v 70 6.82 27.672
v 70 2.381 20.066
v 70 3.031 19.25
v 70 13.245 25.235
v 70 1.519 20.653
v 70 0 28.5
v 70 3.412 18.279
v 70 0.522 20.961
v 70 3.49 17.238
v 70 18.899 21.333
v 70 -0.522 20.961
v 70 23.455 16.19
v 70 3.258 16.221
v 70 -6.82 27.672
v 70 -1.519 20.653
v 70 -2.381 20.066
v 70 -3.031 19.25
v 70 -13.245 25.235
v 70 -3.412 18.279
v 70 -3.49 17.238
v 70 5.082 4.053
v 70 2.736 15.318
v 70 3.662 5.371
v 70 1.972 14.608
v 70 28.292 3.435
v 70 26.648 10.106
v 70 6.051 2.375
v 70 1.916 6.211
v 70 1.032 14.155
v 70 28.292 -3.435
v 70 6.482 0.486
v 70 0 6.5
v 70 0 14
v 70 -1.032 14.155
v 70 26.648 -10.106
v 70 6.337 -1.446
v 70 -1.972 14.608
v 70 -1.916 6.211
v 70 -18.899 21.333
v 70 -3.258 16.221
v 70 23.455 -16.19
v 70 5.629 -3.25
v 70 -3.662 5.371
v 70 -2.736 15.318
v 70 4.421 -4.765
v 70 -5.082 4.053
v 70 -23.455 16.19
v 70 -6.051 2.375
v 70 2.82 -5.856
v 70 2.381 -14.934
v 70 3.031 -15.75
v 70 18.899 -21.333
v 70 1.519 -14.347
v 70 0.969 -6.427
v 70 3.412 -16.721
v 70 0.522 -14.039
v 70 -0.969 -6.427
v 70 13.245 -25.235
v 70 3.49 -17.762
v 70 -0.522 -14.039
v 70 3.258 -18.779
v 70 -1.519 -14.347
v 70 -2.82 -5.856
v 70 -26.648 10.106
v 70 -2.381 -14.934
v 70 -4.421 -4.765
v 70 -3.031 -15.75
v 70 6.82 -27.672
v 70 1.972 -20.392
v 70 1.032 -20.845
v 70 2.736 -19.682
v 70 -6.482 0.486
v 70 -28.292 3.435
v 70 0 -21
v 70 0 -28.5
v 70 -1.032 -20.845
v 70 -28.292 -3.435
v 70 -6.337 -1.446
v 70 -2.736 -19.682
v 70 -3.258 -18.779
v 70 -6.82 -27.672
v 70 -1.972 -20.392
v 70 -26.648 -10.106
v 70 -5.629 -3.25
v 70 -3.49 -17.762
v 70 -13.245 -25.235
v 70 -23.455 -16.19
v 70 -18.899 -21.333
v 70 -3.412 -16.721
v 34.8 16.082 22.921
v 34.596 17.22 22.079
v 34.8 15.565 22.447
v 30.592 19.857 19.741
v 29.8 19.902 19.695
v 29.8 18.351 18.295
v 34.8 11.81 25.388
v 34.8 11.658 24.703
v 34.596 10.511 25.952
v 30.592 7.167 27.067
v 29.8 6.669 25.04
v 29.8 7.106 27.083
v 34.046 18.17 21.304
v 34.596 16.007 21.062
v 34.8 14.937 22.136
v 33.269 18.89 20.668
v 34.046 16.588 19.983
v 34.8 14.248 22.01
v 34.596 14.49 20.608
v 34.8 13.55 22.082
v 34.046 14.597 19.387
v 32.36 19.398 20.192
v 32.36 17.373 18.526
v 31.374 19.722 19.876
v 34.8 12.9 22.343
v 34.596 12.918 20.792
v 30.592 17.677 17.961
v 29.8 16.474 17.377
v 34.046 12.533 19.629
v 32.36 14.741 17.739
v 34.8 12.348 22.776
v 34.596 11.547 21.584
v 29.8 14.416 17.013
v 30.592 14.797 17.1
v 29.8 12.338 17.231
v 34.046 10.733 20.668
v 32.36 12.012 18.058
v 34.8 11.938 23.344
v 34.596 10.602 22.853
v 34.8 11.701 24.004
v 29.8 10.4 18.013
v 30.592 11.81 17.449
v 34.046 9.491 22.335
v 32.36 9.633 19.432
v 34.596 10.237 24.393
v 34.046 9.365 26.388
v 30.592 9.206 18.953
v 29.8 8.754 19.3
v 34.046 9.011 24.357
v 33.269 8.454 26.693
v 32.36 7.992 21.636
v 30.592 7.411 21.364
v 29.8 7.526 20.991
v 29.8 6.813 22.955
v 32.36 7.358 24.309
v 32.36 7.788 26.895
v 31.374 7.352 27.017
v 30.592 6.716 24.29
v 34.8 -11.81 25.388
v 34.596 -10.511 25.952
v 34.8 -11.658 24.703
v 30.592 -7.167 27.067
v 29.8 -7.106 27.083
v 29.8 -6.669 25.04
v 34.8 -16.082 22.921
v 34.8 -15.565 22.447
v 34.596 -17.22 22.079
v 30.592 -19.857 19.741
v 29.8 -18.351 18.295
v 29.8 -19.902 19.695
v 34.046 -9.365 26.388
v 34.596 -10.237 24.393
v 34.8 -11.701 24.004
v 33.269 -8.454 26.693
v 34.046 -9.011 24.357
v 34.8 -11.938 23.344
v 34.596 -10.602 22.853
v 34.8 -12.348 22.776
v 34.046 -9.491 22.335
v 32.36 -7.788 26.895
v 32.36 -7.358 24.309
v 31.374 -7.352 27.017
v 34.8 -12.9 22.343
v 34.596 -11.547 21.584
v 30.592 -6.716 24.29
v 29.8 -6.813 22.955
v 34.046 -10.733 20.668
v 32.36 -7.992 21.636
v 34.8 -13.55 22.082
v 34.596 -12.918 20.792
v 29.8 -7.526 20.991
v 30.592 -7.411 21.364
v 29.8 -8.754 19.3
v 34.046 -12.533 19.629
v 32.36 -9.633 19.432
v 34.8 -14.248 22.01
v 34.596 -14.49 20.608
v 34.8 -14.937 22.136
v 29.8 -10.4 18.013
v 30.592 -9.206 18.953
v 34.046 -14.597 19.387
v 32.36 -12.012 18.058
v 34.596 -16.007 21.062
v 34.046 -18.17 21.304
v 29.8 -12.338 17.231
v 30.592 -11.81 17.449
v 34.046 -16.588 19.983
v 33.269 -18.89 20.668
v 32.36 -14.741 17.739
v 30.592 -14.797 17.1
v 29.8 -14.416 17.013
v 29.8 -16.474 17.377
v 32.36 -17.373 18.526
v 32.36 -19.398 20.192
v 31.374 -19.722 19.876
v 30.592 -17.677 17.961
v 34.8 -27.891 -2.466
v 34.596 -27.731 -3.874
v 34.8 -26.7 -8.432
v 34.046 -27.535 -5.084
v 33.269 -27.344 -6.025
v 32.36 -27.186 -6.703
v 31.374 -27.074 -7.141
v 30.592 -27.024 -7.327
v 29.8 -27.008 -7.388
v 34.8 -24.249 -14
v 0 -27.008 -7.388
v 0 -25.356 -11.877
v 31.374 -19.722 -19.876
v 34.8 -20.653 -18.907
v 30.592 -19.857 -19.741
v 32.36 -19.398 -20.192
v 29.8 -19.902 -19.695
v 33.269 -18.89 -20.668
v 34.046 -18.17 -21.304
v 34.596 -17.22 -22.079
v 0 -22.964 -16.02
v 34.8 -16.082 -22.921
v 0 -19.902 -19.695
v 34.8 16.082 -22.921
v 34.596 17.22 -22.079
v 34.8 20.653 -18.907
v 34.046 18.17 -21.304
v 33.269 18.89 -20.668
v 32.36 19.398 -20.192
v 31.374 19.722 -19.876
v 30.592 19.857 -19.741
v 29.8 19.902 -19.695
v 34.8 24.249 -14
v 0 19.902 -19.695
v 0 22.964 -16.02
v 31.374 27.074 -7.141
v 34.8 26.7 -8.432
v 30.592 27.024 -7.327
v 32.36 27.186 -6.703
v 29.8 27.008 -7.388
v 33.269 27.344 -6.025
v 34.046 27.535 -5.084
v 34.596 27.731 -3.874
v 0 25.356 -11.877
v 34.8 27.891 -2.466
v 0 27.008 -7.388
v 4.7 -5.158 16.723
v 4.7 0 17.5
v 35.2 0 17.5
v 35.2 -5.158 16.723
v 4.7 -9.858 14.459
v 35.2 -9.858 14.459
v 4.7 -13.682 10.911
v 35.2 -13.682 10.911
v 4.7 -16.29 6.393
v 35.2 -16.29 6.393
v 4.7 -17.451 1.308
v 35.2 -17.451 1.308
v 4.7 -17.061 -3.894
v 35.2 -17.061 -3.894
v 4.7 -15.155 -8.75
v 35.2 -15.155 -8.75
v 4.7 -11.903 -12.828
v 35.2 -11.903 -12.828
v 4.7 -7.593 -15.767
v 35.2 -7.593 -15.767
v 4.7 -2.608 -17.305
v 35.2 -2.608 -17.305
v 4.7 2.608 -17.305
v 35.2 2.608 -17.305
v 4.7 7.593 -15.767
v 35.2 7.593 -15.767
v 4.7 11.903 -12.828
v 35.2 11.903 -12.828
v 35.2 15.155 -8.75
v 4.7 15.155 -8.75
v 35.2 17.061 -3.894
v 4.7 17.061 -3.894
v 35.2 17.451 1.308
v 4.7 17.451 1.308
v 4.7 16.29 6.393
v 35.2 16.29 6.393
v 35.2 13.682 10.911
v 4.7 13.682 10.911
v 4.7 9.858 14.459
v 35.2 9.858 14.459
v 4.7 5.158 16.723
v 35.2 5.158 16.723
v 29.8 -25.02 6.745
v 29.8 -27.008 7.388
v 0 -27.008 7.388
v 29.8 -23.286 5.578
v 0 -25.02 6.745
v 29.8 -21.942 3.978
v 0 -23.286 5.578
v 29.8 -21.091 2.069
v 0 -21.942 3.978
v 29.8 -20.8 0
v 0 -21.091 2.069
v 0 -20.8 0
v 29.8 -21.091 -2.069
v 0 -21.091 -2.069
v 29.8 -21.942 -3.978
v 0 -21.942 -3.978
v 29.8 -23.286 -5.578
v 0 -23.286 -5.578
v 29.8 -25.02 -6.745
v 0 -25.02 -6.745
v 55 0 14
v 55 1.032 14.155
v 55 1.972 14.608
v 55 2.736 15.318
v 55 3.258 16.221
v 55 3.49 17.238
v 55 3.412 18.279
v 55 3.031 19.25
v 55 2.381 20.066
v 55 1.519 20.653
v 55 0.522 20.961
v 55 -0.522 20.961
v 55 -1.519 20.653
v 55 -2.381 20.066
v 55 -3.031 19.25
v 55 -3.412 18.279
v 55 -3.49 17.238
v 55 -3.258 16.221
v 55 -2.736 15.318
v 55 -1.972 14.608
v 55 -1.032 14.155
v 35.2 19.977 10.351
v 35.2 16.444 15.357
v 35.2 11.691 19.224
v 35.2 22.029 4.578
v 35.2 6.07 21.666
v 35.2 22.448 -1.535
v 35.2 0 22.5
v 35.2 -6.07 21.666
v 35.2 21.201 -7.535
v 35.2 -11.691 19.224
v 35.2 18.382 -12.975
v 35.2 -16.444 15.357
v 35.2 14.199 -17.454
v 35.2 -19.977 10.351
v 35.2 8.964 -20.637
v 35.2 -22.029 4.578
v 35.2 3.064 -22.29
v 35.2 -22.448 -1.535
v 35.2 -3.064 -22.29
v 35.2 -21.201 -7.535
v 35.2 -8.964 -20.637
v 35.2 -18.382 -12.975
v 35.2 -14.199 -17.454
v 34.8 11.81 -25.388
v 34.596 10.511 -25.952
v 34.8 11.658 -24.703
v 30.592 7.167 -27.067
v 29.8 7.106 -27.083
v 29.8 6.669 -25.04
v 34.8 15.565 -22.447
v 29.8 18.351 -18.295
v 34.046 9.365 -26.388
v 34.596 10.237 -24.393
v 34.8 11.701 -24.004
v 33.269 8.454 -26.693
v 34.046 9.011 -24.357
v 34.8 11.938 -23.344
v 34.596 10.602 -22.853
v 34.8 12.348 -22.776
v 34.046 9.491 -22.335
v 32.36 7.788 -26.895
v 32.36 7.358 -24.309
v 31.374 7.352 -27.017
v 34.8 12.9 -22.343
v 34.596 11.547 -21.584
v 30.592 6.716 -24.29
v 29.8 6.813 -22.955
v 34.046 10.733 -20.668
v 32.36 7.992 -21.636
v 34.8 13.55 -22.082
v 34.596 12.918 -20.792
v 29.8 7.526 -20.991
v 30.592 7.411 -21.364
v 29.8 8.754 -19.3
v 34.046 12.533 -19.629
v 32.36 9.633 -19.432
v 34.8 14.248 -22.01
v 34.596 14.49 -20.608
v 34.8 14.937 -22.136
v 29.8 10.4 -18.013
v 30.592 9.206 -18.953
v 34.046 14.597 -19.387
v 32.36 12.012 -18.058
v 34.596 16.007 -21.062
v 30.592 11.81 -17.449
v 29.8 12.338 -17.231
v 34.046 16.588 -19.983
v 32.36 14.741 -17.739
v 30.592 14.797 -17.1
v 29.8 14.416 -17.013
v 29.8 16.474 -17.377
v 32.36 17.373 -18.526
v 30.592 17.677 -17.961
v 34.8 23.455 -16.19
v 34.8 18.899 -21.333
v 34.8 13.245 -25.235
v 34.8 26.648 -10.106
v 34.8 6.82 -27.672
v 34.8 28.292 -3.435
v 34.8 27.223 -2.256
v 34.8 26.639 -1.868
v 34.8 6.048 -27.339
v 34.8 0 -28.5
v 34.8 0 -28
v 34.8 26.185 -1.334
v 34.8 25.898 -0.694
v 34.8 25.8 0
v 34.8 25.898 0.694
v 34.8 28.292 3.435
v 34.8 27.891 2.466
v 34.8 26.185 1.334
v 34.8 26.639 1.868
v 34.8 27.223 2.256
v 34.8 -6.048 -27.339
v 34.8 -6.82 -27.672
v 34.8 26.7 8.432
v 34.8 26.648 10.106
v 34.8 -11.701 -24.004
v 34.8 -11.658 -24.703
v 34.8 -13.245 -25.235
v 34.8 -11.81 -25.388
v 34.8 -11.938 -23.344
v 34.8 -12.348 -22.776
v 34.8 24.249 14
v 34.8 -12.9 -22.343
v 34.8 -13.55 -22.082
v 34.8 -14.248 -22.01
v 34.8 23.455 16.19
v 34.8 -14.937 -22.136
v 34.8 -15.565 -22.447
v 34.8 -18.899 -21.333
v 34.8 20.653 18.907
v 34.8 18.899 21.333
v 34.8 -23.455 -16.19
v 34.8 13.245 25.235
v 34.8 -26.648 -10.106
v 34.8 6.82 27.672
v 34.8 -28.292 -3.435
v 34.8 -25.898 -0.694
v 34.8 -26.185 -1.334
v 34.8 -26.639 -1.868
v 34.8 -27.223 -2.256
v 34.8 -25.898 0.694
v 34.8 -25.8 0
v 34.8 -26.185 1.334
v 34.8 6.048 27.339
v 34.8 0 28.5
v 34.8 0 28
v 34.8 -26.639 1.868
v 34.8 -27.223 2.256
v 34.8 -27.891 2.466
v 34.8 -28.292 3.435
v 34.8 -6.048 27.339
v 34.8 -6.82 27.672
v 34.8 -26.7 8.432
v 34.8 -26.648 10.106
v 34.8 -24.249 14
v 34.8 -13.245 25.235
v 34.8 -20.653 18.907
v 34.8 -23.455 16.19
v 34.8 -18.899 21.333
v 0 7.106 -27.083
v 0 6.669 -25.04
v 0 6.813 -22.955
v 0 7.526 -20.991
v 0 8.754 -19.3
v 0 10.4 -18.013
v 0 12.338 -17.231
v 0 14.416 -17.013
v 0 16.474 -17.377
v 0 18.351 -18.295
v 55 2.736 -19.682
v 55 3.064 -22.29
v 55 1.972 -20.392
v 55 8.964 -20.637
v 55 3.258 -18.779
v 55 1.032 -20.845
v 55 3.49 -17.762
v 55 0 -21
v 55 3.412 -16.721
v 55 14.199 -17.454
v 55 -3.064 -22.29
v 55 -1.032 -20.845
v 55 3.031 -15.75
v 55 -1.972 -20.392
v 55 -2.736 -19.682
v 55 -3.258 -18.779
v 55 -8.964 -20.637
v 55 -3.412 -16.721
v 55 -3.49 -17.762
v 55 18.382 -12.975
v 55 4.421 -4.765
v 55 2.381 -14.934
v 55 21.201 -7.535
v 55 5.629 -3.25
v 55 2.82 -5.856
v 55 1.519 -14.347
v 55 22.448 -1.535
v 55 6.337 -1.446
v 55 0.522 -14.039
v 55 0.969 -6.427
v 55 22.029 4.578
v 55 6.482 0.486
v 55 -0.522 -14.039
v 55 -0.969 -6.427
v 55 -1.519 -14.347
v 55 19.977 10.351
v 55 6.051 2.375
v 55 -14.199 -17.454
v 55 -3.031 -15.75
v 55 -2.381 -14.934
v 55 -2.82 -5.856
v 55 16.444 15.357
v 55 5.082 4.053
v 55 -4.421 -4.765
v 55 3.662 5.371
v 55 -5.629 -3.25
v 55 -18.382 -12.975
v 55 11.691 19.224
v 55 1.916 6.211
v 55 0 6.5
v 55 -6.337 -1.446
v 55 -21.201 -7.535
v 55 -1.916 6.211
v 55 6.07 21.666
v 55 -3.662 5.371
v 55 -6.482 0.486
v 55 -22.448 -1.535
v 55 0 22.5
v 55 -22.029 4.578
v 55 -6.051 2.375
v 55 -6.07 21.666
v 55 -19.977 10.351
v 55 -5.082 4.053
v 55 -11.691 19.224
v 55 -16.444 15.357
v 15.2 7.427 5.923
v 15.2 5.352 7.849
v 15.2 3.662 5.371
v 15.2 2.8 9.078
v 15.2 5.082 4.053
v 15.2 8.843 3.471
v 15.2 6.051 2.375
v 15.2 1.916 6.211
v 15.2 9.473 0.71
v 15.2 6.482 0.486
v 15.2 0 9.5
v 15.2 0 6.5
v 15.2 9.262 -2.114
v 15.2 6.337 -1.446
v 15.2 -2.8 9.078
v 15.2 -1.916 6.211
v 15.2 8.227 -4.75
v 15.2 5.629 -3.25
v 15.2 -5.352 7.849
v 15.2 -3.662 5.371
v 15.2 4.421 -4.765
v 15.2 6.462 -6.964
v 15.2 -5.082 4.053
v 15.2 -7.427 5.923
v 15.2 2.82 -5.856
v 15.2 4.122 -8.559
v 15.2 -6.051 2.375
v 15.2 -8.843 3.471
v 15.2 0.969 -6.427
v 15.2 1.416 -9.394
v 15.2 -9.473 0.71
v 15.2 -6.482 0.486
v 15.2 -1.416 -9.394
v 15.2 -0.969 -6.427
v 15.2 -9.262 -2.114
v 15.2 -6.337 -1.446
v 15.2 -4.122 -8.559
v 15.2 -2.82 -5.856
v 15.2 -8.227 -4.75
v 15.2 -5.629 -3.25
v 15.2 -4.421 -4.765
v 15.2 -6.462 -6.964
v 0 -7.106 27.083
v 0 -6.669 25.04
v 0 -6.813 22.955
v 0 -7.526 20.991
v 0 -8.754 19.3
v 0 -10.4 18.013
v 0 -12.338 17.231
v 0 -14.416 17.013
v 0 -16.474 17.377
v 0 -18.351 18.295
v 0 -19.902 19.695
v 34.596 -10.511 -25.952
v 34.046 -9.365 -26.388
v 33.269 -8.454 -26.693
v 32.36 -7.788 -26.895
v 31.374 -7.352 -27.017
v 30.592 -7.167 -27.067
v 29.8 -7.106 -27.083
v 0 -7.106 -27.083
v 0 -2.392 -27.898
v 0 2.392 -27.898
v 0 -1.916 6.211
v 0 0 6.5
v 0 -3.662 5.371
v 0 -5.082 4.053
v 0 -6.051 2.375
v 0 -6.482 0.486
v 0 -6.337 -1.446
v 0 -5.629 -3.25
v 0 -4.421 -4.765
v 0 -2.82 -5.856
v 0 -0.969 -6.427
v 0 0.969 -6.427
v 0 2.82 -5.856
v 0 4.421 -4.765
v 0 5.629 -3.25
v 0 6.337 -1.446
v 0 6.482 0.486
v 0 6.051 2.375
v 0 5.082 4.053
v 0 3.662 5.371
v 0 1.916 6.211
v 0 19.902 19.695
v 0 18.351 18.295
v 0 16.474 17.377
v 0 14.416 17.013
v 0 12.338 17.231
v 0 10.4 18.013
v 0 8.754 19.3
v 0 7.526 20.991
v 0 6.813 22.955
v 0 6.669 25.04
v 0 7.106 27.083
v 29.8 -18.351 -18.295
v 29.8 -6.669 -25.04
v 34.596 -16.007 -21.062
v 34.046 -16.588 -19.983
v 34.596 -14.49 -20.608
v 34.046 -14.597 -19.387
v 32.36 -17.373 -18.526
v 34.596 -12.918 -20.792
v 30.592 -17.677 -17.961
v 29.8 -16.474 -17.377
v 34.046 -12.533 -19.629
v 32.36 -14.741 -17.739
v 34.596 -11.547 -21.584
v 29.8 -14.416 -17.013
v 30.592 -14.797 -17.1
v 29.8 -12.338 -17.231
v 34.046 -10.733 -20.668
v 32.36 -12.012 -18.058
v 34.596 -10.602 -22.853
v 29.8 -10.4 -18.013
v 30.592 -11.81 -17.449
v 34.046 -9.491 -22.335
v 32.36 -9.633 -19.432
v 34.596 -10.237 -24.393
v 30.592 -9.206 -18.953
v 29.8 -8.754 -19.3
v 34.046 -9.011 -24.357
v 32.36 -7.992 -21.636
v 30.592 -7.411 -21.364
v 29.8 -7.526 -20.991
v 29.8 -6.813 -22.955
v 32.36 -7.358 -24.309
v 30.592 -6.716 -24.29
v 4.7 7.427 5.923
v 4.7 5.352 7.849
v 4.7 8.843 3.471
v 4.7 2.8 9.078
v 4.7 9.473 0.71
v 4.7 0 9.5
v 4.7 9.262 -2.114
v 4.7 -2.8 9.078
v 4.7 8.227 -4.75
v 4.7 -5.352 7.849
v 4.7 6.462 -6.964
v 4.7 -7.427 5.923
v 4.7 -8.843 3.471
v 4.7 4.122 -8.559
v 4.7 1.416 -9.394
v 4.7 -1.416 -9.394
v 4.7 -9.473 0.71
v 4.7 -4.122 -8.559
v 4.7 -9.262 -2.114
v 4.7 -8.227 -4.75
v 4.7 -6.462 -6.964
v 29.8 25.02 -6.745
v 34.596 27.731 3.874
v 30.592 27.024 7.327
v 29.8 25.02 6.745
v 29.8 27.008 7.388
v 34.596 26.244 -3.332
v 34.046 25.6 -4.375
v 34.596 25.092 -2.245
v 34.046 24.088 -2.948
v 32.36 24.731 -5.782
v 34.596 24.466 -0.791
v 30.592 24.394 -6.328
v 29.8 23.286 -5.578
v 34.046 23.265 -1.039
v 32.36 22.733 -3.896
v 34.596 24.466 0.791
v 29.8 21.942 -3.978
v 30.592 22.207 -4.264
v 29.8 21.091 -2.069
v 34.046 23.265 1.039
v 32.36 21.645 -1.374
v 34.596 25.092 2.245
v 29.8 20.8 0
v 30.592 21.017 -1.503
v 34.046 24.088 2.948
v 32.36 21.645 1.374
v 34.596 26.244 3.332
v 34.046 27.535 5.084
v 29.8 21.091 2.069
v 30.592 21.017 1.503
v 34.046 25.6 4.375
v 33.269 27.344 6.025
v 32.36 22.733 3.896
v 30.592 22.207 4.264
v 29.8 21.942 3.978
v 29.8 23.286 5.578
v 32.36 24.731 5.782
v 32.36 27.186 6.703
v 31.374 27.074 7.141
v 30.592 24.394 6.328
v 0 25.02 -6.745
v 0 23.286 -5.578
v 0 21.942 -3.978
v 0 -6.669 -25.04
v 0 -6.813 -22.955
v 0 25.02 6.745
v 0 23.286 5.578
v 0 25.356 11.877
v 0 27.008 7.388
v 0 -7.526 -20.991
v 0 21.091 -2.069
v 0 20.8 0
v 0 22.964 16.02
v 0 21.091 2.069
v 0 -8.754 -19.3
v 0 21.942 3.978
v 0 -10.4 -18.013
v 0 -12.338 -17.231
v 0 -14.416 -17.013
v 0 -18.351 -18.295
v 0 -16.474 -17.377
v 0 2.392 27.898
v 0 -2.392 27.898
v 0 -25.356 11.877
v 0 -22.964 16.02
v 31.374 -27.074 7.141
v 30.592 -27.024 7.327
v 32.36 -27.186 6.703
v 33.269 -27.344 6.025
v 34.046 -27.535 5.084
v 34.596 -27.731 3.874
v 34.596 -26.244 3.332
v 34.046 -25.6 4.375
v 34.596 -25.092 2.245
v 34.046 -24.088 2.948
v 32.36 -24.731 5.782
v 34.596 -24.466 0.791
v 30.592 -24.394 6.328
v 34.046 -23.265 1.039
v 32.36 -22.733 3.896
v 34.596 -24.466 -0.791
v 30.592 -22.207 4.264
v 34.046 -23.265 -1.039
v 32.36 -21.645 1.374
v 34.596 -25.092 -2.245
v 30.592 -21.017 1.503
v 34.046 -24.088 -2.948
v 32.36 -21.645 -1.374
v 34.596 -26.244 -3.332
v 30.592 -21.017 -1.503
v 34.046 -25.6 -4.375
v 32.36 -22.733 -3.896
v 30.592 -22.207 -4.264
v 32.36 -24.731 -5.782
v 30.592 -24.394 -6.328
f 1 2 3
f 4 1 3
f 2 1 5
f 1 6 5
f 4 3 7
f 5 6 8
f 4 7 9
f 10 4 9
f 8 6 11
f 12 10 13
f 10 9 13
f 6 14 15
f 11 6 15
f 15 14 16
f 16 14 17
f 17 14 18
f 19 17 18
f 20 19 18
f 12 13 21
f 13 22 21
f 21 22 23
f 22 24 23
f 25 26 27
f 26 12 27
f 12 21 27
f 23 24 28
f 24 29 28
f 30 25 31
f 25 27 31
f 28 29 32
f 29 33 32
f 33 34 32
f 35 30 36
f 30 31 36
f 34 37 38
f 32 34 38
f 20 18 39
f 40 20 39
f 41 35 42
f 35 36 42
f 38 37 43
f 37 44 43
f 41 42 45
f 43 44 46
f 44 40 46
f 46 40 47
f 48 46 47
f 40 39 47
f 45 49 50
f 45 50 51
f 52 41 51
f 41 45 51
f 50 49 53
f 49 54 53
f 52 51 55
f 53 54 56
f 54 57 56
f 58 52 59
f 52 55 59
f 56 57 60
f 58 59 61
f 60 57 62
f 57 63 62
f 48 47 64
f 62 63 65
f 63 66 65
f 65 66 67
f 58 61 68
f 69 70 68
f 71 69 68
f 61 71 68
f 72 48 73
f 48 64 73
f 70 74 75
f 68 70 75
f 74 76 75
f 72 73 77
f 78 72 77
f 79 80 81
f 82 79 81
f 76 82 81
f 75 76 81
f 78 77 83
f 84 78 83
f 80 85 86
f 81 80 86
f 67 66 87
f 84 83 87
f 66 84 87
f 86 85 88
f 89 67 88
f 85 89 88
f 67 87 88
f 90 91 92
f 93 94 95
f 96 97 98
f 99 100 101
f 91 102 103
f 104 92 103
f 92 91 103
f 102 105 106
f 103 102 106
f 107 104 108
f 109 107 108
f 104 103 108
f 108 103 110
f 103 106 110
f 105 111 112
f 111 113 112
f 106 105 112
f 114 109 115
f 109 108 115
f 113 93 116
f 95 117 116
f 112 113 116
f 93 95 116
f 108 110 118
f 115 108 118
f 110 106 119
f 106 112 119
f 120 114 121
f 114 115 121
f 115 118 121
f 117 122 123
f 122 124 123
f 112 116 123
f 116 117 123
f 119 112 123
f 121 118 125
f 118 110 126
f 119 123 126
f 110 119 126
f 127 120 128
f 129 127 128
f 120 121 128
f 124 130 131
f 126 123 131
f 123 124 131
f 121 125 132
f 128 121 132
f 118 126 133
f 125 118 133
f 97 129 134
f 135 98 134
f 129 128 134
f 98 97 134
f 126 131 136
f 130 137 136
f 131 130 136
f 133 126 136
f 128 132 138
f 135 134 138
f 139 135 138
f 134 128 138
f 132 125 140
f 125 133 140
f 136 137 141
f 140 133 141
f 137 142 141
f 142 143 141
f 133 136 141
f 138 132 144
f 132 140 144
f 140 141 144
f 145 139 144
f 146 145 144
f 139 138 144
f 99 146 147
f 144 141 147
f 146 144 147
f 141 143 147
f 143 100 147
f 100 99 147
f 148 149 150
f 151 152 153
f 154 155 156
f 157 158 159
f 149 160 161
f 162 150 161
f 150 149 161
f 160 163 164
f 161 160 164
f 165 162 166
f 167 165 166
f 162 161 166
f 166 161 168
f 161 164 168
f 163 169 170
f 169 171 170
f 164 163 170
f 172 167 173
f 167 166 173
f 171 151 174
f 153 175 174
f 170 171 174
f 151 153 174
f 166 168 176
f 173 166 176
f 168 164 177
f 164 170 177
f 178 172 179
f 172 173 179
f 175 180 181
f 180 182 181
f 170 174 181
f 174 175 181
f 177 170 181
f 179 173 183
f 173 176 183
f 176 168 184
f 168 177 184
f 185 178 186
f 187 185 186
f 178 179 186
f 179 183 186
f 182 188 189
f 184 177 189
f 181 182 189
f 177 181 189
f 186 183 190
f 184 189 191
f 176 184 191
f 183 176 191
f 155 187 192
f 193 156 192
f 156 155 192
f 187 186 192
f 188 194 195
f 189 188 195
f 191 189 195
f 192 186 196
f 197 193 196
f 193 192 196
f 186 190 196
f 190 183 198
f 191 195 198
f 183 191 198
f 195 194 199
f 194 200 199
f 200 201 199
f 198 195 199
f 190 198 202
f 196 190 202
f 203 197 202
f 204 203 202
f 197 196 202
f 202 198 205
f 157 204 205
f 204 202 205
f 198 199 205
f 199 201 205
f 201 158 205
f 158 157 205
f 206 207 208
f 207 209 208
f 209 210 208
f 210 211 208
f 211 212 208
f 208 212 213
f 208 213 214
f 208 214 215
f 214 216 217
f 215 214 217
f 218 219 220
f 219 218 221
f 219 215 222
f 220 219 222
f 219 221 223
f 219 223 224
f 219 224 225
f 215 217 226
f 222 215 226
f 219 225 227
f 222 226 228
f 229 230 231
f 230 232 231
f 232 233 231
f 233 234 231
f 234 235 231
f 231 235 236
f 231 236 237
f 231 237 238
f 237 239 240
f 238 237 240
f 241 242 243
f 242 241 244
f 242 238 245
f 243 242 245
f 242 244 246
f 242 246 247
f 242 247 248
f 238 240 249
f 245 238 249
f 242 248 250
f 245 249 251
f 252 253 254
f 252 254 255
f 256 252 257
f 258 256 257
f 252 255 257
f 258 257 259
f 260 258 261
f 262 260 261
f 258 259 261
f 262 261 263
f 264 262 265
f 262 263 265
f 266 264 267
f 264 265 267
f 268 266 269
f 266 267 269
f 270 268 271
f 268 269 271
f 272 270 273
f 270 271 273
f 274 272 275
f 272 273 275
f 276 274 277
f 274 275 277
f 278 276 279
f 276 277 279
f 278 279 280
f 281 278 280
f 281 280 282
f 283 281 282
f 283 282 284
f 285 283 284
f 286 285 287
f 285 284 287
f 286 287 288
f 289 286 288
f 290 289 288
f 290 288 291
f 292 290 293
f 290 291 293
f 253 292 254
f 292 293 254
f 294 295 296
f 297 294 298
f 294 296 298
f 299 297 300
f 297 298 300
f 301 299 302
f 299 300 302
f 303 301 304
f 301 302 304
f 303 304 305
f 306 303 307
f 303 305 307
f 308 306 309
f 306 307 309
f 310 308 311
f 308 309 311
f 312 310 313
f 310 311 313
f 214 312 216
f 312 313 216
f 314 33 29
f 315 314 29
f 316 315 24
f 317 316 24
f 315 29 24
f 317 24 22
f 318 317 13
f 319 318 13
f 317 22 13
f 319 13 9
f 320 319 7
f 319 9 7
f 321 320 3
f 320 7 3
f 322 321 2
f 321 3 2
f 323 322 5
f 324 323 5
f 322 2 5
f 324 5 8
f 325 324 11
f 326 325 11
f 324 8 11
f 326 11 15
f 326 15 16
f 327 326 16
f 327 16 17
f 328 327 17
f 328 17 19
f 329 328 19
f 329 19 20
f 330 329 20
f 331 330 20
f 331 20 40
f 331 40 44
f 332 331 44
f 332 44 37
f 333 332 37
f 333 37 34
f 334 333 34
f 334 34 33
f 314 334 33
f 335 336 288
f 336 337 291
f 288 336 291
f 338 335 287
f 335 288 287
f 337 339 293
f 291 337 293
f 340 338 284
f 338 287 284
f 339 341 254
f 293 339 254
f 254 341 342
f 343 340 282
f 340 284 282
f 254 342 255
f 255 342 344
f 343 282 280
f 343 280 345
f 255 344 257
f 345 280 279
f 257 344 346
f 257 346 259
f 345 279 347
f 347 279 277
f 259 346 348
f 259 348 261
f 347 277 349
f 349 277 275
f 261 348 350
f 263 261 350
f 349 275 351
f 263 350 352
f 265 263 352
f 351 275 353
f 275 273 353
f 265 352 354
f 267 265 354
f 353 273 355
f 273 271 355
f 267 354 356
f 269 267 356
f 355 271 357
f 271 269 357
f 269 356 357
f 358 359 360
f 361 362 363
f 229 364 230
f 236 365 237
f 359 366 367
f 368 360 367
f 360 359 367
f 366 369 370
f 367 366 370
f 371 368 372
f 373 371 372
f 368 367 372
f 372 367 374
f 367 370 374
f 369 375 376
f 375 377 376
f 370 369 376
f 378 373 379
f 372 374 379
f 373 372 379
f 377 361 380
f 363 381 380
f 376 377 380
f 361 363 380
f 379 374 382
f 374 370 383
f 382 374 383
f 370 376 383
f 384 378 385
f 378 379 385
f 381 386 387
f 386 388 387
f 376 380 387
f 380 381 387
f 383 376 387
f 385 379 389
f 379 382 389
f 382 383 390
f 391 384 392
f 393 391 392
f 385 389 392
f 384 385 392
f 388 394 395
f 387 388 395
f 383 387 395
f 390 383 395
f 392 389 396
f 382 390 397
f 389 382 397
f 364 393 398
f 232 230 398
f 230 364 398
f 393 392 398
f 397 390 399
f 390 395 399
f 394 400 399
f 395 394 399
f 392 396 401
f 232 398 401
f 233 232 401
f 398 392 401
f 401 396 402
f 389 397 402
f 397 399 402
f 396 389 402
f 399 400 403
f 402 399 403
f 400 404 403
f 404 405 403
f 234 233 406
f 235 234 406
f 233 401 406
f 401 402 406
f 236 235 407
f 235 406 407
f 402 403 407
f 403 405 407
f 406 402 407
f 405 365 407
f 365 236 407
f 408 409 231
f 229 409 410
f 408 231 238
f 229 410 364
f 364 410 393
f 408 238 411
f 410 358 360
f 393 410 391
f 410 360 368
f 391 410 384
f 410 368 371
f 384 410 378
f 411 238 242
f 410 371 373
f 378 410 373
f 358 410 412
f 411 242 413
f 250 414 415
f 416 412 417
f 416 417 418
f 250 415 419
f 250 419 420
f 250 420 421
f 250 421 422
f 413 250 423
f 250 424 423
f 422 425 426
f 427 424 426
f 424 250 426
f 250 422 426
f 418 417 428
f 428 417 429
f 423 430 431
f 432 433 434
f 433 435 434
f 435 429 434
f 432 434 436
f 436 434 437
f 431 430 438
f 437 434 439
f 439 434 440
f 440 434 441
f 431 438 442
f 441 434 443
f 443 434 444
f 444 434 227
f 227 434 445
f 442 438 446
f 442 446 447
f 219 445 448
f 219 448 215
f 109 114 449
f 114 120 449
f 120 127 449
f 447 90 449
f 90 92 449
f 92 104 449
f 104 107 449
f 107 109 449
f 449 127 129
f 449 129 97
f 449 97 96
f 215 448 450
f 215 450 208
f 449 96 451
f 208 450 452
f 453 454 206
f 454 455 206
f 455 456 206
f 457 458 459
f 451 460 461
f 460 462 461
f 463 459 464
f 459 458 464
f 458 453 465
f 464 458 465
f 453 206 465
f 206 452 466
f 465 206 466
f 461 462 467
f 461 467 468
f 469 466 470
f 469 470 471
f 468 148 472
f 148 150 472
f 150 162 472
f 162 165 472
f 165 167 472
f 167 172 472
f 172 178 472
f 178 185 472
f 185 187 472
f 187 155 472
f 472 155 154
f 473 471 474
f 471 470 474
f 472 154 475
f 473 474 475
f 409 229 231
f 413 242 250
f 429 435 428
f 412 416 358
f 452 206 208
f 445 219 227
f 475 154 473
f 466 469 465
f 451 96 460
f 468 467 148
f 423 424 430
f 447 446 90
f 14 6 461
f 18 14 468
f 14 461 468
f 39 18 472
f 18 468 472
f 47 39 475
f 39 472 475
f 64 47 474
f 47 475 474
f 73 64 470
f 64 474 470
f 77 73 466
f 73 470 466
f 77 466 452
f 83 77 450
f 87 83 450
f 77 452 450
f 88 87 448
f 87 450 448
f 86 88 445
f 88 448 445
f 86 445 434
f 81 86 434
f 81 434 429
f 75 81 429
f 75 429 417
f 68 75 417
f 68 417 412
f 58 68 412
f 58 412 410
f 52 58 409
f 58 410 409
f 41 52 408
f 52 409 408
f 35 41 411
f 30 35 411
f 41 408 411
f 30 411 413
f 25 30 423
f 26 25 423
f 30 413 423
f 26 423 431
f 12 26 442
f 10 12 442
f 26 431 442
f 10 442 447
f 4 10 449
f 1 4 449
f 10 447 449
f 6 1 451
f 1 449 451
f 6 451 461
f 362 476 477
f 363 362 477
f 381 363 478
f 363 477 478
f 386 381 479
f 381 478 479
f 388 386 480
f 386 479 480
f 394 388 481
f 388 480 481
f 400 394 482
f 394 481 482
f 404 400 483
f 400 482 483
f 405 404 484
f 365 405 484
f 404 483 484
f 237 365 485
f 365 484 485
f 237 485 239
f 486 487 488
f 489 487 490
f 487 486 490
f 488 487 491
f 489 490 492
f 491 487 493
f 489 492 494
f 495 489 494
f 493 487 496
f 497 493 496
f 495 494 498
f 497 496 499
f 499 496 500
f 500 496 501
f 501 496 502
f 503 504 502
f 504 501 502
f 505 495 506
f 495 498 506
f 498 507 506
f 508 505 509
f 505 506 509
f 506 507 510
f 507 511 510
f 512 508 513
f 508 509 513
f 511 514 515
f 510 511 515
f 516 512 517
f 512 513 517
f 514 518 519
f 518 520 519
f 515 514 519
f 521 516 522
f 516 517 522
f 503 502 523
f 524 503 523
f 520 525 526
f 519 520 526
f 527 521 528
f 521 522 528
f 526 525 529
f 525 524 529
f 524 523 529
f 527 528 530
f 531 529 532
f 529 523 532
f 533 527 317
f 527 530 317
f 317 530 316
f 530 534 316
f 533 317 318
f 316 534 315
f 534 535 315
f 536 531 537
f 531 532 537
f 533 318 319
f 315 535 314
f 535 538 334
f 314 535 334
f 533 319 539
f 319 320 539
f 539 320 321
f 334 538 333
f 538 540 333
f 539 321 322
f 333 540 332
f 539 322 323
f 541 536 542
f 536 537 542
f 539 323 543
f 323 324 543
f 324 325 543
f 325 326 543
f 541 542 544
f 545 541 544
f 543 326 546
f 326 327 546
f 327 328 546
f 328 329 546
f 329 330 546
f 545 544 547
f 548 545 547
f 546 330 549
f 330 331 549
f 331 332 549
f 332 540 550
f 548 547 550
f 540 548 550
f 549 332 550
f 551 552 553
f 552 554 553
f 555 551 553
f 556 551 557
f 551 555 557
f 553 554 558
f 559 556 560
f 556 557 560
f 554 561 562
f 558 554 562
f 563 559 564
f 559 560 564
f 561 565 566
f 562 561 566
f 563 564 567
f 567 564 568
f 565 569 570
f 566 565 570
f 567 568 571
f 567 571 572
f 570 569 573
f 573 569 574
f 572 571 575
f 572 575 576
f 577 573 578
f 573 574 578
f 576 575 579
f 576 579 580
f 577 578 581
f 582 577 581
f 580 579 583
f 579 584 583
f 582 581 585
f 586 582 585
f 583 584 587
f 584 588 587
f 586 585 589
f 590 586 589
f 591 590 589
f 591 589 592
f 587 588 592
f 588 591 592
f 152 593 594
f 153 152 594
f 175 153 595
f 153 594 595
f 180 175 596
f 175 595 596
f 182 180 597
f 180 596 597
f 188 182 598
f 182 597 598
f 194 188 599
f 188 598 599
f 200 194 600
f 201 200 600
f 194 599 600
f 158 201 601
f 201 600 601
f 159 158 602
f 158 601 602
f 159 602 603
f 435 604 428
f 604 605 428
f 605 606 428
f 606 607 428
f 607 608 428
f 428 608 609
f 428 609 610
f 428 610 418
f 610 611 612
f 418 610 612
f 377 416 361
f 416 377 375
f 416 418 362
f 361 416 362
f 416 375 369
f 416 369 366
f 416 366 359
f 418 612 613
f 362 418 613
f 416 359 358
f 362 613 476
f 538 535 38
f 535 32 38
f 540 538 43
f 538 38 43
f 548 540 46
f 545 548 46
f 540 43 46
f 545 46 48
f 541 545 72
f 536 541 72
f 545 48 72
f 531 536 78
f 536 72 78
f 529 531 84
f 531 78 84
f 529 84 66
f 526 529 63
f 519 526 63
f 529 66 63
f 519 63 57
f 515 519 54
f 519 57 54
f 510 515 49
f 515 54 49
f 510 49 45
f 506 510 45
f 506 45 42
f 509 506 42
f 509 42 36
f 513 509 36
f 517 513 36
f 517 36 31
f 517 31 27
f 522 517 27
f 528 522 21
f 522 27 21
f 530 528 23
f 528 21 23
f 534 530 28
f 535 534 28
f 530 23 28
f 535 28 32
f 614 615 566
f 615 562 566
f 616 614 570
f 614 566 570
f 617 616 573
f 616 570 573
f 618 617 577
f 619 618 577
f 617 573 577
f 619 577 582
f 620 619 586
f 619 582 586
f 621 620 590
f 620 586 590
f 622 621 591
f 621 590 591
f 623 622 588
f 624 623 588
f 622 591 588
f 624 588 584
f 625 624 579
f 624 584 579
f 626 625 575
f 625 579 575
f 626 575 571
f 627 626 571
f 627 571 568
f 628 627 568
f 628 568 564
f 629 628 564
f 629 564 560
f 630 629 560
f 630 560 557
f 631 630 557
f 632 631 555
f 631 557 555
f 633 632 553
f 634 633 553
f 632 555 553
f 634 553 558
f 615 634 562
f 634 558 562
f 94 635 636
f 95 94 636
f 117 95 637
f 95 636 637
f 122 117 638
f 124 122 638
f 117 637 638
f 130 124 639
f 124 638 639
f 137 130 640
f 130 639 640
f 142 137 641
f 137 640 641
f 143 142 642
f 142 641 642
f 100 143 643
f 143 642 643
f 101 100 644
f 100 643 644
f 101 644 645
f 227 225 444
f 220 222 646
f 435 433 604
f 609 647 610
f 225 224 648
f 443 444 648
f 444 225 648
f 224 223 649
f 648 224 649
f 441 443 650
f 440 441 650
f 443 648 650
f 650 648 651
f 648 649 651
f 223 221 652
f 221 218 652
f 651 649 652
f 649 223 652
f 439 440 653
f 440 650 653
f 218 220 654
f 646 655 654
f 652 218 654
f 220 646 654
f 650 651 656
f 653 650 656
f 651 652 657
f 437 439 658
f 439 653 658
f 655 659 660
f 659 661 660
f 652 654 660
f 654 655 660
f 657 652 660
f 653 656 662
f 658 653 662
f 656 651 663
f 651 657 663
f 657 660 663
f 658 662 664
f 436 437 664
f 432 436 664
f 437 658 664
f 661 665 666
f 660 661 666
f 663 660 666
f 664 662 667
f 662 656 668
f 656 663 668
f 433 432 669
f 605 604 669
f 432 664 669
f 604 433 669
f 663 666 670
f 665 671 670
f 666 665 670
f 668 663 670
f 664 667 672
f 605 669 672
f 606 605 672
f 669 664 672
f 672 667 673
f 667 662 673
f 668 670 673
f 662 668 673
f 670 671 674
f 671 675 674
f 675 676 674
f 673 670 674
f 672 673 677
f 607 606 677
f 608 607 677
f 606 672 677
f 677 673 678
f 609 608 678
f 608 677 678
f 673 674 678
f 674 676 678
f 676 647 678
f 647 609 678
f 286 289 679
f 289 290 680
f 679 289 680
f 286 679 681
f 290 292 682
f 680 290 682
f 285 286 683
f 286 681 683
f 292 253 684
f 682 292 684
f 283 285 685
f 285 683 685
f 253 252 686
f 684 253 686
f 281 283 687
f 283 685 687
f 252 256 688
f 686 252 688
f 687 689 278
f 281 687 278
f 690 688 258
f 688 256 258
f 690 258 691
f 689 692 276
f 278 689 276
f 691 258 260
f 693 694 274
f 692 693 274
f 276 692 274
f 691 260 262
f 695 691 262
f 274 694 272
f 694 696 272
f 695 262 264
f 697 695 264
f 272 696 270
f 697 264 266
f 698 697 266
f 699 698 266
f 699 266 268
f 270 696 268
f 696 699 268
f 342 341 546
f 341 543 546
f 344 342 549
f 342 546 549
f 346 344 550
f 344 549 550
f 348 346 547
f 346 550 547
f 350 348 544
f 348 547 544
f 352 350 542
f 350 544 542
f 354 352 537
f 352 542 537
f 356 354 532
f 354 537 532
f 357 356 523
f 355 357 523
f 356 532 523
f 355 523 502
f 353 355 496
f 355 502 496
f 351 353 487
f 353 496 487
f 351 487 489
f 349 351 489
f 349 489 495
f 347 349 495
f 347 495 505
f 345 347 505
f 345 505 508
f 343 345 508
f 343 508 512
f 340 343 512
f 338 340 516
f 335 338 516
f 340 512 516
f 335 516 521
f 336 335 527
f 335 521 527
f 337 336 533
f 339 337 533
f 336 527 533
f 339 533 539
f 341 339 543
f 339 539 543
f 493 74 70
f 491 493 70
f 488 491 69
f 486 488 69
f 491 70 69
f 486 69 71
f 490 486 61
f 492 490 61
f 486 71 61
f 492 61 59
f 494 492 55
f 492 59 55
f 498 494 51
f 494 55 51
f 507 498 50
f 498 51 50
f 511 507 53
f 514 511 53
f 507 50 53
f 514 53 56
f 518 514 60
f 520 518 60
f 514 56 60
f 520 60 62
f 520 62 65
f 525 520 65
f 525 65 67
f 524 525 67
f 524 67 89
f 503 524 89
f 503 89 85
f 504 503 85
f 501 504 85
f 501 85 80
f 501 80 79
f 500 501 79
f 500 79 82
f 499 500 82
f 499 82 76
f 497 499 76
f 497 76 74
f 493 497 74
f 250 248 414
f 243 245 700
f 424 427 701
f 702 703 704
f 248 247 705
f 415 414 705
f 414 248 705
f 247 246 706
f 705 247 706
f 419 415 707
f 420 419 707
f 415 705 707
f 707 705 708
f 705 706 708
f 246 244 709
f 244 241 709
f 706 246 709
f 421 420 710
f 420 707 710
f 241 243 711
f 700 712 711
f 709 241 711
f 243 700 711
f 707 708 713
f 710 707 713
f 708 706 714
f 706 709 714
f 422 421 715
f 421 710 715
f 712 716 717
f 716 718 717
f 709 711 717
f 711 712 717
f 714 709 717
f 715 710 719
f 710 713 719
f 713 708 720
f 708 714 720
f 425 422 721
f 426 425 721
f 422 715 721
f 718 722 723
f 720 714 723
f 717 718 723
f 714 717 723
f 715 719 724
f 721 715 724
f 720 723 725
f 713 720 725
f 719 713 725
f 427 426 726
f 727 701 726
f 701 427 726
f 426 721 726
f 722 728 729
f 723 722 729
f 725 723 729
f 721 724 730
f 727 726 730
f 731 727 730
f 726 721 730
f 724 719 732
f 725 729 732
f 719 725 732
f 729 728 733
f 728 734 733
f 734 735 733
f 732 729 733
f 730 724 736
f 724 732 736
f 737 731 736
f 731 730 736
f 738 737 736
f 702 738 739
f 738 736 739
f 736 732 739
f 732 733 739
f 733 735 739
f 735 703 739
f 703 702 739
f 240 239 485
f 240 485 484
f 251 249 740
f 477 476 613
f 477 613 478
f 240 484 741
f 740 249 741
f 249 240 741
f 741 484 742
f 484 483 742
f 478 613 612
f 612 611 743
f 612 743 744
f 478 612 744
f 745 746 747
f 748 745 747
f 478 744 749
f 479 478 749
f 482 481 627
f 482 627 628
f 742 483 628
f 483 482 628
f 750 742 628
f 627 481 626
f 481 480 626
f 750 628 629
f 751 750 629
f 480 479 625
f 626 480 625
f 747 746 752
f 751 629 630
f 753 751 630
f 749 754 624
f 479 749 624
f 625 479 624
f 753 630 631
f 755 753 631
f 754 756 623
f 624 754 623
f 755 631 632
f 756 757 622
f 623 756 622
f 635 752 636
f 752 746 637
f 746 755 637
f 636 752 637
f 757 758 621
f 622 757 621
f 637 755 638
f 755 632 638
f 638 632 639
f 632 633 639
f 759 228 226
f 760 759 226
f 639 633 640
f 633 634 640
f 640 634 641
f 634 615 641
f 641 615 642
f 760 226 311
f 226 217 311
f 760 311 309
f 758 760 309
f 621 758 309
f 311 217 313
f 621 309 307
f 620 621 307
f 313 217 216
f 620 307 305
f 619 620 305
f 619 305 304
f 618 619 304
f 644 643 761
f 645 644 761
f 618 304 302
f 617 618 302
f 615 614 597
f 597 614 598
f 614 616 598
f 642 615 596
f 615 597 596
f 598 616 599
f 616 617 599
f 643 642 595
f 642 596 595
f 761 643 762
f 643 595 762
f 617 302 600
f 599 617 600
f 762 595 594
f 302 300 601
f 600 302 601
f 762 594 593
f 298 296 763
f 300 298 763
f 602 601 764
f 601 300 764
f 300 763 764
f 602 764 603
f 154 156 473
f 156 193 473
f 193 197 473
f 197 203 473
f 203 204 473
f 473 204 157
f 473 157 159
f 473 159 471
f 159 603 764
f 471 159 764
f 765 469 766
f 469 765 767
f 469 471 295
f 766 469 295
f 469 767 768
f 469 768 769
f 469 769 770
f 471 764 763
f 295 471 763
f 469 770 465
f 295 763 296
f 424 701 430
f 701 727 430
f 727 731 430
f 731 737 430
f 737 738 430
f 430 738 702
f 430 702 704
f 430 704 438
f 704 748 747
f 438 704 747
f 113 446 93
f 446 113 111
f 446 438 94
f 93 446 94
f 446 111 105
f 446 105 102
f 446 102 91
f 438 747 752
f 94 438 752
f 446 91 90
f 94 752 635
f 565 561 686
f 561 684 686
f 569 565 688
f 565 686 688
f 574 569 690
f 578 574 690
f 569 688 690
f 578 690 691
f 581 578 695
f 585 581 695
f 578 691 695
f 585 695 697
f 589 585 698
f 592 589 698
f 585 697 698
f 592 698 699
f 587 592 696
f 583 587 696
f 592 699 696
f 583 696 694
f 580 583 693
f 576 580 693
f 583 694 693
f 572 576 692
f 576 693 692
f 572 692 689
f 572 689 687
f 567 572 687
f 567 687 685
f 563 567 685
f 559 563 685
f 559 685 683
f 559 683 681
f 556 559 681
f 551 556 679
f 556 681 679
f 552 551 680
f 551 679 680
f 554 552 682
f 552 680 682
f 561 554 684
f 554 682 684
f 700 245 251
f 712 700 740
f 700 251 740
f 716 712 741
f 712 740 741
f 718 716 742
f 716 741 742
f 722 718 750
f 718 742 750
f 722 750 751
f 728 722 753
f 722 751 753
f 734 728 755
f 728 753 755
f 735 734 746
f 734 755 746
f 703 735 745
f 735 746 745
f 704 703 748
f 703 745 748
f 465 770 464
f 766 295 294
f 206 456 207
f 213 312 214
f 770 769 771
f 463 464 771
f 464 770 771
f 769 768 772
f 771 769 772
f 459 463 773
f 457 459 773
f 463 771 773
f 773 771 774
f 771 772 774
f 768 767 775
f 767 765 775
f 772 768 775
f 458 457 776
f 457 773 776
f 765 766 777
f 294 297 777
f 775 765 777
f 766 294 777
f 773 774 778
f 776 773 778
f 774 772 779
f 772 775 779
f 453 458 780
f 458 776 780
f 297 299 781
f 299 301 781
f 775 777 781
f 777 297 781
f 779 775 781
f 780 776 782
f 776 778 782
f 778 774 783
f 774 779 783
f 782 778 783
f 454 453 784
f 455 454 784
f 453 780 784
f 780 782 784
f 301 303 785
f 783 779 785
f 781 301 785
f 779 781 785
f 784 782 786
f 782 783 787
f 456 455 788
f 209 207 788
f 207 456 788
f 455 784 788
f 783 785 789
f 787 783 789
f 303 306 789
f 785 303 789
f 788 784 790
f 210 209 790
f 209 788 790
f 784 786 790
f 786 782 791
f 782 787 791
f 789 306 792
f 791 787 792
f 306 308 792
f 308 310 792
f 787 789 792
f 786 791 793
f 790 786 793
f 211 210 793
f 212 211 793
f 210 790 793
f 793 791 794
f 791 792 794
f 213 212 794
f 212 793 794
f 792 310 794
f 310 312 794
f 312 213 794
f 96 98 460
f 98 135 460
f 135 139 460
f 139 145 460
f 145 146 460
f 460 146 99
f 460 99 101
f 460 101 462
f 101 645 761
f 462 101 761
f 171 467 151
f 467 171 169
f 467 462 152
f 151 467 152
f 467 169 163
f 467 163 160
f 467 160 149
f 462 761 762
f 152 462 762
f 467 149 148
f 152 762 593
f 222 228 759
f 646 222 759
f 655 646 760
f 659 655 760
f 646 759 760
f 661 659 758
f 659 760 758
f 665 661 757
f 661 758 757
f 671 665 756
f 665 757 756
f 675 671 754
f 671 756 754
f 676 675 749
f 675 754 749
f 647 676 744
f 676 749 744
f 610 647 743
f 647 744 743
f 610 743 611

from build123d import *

# Parameters (mm, degrees)
CUT_EXTRUDE_1_DEPTH = 34.8
FILLET_1_R          = 5
CUT_EXTRUDE_2_REACH = 82.774
SKETCH_3_R          = 3.5


with BuildPart() as part:
    # Эскиз1 → Повернуть1 (revolve)
    with BuildSketch(Plane.XY, mode=Mode.PRIVATE) as revolve_1_sk:
        Polygon((0, 6.5), (15.2, 6.5), (15.2, 9.5), (4.7, 9.5), (4.7, 17.5), (35.2, 17.5), (35.2, 22.5), (55, 22.5), (55, 6.5), (70, 6.5), (70, 28.5), (34.8, 28.5), (34.8, 28), (0, 28), align=None)
    revolve(revolve_1_sk.sketch.rotate(Axis((-15.709814328, 0, 0), (1, 0, 0)), 90), axis=Axis((-15.709814328, 0, 0), (1, 0, 0)))

    # Эскиз2 → Вырез-Вытянуть1 (cut)
    with BuildSketch(Plane.ZY):
        with BuildLine():
            ThreePointArc((-7.5, 28.272115237), (0, 20.8), (7.5, 28.272115237))
            ThreePointArc((7.5, 28.272115237), (0, 29.25), (-7.5, 28.272115237))
        make_face()
        with BuildLine():
            ThreePointArc((20.734370014, 20.631248147), (18.013328399, 10.4), (28.234370014, 7.64086709))
            ThreePointArc((28.234370014, 7.64086709), (25.331243061, 14.625), (20.734370014, 20.631248147))
        make_face()
        with BuildLine():
            ThreePointArc((28.234370014, -7.64086709), (18.013328399, -10.4), (20.734370014, -20.631248147))
            ThreePointArc((20.734370014, -20.631248147), (25.331243061, -14.625), (28.234370014, -7.64086709))
        make_face()
        with BuildLine():
            ThreePointArc((7.5, -28.272115237), (0, -20.8), (-7.5, -28.272115237))
            ThreePointArc((-7.5, -28.272115237), (0, -29.25), (7.5, -28.272115237))
        make_face()
        with BuildLine():
            ThreePointArc((-20.734370014, -20.631248147), (-18.013328399, -10.4), (-28.234370014, -7.64086709))
            ThreePointArc((-28.234370014, -7.64086709), (-25.331243061, -14.625), (-20.734370014, -20.631248147))
        make_face()
        with BuildLine():
            ThreePointArc((-28.234370014, 7.64086709), (-18.013328399, 10.4), (-20.734370014, 20.631248147))
            ThreePointArc((-20.734370014, 20.631248147), (-25.331243061, 14.625), (-28.234370014, 7.64086709))
        make_face()
    extrude(amount=-CUT_EXTRUDE_1_DEPTH, mode=Mode.SUBTRACT)

    # Скругление1
    fillet_1_edges = [part.edges().sort_by_distance(p)[0] for p in [
        (34.8, 20.8, 0),
        (34.8, 10.4, 18.013328399),
        (34.8, -10.4, 18.013328399),
        (34.8, -20.8, 0),
        (34.8, -10.4, -18.013328399),
        (34.8, 10.4, -18.013328399),
    ]]
    fillet(fillet_1_edges, radius=FILLET_1_R)

    # Эскиз3 → Вырез-Вытянуть2 (cut, up to next)
    with BuildSketch(Plane(origin=(70, 0, 0), x_dir=(0, 0, -1), z_dir=(1, 0, 0)), mode=Mode.PRIVATE) as cut_extrude_2_sk1:
        with Locations((-17.5, 0)):
            Circle(SKETCH_3_R)
    cut_extrude_2_tool1 = extrude(cut_extrude_2_sk1.sketch, amount=-CUT_EXTRUDE_2_REACH, mode=Mode.PRIVATE) & part.part
    # Эскиз3 → Вырез-Вытянуть2 (cut, up to next)
    with BuildSketch(Plane(origin=(70, 0, 0), x_dir=(0, 0, -1), z_dir=(1, 0, 0)), mode=Mode.PRIVATE) as cut_extrude_2_sk2:
        with Locations((17.5, 0)):
            Circle(SKETCH_3_R)
    cut_extrude_2_tool2 = extrude(cut_extrude_2_sk2.sketch, amount=-CUT_EXTRUDE_2_REACH, mode=Mode.PRIVATE) & part.part
    add(cut_extrude_2_tool1.solids().sort_by_distance((70, 0, 17.5))[0], mode=Mode.SUBTRACT)
    add(cut_extrude_2_tool2.solids().sort_by_distance((70, 0, -17.5))[0], mode=Mode.SUBTRACT)


solid = part.part
